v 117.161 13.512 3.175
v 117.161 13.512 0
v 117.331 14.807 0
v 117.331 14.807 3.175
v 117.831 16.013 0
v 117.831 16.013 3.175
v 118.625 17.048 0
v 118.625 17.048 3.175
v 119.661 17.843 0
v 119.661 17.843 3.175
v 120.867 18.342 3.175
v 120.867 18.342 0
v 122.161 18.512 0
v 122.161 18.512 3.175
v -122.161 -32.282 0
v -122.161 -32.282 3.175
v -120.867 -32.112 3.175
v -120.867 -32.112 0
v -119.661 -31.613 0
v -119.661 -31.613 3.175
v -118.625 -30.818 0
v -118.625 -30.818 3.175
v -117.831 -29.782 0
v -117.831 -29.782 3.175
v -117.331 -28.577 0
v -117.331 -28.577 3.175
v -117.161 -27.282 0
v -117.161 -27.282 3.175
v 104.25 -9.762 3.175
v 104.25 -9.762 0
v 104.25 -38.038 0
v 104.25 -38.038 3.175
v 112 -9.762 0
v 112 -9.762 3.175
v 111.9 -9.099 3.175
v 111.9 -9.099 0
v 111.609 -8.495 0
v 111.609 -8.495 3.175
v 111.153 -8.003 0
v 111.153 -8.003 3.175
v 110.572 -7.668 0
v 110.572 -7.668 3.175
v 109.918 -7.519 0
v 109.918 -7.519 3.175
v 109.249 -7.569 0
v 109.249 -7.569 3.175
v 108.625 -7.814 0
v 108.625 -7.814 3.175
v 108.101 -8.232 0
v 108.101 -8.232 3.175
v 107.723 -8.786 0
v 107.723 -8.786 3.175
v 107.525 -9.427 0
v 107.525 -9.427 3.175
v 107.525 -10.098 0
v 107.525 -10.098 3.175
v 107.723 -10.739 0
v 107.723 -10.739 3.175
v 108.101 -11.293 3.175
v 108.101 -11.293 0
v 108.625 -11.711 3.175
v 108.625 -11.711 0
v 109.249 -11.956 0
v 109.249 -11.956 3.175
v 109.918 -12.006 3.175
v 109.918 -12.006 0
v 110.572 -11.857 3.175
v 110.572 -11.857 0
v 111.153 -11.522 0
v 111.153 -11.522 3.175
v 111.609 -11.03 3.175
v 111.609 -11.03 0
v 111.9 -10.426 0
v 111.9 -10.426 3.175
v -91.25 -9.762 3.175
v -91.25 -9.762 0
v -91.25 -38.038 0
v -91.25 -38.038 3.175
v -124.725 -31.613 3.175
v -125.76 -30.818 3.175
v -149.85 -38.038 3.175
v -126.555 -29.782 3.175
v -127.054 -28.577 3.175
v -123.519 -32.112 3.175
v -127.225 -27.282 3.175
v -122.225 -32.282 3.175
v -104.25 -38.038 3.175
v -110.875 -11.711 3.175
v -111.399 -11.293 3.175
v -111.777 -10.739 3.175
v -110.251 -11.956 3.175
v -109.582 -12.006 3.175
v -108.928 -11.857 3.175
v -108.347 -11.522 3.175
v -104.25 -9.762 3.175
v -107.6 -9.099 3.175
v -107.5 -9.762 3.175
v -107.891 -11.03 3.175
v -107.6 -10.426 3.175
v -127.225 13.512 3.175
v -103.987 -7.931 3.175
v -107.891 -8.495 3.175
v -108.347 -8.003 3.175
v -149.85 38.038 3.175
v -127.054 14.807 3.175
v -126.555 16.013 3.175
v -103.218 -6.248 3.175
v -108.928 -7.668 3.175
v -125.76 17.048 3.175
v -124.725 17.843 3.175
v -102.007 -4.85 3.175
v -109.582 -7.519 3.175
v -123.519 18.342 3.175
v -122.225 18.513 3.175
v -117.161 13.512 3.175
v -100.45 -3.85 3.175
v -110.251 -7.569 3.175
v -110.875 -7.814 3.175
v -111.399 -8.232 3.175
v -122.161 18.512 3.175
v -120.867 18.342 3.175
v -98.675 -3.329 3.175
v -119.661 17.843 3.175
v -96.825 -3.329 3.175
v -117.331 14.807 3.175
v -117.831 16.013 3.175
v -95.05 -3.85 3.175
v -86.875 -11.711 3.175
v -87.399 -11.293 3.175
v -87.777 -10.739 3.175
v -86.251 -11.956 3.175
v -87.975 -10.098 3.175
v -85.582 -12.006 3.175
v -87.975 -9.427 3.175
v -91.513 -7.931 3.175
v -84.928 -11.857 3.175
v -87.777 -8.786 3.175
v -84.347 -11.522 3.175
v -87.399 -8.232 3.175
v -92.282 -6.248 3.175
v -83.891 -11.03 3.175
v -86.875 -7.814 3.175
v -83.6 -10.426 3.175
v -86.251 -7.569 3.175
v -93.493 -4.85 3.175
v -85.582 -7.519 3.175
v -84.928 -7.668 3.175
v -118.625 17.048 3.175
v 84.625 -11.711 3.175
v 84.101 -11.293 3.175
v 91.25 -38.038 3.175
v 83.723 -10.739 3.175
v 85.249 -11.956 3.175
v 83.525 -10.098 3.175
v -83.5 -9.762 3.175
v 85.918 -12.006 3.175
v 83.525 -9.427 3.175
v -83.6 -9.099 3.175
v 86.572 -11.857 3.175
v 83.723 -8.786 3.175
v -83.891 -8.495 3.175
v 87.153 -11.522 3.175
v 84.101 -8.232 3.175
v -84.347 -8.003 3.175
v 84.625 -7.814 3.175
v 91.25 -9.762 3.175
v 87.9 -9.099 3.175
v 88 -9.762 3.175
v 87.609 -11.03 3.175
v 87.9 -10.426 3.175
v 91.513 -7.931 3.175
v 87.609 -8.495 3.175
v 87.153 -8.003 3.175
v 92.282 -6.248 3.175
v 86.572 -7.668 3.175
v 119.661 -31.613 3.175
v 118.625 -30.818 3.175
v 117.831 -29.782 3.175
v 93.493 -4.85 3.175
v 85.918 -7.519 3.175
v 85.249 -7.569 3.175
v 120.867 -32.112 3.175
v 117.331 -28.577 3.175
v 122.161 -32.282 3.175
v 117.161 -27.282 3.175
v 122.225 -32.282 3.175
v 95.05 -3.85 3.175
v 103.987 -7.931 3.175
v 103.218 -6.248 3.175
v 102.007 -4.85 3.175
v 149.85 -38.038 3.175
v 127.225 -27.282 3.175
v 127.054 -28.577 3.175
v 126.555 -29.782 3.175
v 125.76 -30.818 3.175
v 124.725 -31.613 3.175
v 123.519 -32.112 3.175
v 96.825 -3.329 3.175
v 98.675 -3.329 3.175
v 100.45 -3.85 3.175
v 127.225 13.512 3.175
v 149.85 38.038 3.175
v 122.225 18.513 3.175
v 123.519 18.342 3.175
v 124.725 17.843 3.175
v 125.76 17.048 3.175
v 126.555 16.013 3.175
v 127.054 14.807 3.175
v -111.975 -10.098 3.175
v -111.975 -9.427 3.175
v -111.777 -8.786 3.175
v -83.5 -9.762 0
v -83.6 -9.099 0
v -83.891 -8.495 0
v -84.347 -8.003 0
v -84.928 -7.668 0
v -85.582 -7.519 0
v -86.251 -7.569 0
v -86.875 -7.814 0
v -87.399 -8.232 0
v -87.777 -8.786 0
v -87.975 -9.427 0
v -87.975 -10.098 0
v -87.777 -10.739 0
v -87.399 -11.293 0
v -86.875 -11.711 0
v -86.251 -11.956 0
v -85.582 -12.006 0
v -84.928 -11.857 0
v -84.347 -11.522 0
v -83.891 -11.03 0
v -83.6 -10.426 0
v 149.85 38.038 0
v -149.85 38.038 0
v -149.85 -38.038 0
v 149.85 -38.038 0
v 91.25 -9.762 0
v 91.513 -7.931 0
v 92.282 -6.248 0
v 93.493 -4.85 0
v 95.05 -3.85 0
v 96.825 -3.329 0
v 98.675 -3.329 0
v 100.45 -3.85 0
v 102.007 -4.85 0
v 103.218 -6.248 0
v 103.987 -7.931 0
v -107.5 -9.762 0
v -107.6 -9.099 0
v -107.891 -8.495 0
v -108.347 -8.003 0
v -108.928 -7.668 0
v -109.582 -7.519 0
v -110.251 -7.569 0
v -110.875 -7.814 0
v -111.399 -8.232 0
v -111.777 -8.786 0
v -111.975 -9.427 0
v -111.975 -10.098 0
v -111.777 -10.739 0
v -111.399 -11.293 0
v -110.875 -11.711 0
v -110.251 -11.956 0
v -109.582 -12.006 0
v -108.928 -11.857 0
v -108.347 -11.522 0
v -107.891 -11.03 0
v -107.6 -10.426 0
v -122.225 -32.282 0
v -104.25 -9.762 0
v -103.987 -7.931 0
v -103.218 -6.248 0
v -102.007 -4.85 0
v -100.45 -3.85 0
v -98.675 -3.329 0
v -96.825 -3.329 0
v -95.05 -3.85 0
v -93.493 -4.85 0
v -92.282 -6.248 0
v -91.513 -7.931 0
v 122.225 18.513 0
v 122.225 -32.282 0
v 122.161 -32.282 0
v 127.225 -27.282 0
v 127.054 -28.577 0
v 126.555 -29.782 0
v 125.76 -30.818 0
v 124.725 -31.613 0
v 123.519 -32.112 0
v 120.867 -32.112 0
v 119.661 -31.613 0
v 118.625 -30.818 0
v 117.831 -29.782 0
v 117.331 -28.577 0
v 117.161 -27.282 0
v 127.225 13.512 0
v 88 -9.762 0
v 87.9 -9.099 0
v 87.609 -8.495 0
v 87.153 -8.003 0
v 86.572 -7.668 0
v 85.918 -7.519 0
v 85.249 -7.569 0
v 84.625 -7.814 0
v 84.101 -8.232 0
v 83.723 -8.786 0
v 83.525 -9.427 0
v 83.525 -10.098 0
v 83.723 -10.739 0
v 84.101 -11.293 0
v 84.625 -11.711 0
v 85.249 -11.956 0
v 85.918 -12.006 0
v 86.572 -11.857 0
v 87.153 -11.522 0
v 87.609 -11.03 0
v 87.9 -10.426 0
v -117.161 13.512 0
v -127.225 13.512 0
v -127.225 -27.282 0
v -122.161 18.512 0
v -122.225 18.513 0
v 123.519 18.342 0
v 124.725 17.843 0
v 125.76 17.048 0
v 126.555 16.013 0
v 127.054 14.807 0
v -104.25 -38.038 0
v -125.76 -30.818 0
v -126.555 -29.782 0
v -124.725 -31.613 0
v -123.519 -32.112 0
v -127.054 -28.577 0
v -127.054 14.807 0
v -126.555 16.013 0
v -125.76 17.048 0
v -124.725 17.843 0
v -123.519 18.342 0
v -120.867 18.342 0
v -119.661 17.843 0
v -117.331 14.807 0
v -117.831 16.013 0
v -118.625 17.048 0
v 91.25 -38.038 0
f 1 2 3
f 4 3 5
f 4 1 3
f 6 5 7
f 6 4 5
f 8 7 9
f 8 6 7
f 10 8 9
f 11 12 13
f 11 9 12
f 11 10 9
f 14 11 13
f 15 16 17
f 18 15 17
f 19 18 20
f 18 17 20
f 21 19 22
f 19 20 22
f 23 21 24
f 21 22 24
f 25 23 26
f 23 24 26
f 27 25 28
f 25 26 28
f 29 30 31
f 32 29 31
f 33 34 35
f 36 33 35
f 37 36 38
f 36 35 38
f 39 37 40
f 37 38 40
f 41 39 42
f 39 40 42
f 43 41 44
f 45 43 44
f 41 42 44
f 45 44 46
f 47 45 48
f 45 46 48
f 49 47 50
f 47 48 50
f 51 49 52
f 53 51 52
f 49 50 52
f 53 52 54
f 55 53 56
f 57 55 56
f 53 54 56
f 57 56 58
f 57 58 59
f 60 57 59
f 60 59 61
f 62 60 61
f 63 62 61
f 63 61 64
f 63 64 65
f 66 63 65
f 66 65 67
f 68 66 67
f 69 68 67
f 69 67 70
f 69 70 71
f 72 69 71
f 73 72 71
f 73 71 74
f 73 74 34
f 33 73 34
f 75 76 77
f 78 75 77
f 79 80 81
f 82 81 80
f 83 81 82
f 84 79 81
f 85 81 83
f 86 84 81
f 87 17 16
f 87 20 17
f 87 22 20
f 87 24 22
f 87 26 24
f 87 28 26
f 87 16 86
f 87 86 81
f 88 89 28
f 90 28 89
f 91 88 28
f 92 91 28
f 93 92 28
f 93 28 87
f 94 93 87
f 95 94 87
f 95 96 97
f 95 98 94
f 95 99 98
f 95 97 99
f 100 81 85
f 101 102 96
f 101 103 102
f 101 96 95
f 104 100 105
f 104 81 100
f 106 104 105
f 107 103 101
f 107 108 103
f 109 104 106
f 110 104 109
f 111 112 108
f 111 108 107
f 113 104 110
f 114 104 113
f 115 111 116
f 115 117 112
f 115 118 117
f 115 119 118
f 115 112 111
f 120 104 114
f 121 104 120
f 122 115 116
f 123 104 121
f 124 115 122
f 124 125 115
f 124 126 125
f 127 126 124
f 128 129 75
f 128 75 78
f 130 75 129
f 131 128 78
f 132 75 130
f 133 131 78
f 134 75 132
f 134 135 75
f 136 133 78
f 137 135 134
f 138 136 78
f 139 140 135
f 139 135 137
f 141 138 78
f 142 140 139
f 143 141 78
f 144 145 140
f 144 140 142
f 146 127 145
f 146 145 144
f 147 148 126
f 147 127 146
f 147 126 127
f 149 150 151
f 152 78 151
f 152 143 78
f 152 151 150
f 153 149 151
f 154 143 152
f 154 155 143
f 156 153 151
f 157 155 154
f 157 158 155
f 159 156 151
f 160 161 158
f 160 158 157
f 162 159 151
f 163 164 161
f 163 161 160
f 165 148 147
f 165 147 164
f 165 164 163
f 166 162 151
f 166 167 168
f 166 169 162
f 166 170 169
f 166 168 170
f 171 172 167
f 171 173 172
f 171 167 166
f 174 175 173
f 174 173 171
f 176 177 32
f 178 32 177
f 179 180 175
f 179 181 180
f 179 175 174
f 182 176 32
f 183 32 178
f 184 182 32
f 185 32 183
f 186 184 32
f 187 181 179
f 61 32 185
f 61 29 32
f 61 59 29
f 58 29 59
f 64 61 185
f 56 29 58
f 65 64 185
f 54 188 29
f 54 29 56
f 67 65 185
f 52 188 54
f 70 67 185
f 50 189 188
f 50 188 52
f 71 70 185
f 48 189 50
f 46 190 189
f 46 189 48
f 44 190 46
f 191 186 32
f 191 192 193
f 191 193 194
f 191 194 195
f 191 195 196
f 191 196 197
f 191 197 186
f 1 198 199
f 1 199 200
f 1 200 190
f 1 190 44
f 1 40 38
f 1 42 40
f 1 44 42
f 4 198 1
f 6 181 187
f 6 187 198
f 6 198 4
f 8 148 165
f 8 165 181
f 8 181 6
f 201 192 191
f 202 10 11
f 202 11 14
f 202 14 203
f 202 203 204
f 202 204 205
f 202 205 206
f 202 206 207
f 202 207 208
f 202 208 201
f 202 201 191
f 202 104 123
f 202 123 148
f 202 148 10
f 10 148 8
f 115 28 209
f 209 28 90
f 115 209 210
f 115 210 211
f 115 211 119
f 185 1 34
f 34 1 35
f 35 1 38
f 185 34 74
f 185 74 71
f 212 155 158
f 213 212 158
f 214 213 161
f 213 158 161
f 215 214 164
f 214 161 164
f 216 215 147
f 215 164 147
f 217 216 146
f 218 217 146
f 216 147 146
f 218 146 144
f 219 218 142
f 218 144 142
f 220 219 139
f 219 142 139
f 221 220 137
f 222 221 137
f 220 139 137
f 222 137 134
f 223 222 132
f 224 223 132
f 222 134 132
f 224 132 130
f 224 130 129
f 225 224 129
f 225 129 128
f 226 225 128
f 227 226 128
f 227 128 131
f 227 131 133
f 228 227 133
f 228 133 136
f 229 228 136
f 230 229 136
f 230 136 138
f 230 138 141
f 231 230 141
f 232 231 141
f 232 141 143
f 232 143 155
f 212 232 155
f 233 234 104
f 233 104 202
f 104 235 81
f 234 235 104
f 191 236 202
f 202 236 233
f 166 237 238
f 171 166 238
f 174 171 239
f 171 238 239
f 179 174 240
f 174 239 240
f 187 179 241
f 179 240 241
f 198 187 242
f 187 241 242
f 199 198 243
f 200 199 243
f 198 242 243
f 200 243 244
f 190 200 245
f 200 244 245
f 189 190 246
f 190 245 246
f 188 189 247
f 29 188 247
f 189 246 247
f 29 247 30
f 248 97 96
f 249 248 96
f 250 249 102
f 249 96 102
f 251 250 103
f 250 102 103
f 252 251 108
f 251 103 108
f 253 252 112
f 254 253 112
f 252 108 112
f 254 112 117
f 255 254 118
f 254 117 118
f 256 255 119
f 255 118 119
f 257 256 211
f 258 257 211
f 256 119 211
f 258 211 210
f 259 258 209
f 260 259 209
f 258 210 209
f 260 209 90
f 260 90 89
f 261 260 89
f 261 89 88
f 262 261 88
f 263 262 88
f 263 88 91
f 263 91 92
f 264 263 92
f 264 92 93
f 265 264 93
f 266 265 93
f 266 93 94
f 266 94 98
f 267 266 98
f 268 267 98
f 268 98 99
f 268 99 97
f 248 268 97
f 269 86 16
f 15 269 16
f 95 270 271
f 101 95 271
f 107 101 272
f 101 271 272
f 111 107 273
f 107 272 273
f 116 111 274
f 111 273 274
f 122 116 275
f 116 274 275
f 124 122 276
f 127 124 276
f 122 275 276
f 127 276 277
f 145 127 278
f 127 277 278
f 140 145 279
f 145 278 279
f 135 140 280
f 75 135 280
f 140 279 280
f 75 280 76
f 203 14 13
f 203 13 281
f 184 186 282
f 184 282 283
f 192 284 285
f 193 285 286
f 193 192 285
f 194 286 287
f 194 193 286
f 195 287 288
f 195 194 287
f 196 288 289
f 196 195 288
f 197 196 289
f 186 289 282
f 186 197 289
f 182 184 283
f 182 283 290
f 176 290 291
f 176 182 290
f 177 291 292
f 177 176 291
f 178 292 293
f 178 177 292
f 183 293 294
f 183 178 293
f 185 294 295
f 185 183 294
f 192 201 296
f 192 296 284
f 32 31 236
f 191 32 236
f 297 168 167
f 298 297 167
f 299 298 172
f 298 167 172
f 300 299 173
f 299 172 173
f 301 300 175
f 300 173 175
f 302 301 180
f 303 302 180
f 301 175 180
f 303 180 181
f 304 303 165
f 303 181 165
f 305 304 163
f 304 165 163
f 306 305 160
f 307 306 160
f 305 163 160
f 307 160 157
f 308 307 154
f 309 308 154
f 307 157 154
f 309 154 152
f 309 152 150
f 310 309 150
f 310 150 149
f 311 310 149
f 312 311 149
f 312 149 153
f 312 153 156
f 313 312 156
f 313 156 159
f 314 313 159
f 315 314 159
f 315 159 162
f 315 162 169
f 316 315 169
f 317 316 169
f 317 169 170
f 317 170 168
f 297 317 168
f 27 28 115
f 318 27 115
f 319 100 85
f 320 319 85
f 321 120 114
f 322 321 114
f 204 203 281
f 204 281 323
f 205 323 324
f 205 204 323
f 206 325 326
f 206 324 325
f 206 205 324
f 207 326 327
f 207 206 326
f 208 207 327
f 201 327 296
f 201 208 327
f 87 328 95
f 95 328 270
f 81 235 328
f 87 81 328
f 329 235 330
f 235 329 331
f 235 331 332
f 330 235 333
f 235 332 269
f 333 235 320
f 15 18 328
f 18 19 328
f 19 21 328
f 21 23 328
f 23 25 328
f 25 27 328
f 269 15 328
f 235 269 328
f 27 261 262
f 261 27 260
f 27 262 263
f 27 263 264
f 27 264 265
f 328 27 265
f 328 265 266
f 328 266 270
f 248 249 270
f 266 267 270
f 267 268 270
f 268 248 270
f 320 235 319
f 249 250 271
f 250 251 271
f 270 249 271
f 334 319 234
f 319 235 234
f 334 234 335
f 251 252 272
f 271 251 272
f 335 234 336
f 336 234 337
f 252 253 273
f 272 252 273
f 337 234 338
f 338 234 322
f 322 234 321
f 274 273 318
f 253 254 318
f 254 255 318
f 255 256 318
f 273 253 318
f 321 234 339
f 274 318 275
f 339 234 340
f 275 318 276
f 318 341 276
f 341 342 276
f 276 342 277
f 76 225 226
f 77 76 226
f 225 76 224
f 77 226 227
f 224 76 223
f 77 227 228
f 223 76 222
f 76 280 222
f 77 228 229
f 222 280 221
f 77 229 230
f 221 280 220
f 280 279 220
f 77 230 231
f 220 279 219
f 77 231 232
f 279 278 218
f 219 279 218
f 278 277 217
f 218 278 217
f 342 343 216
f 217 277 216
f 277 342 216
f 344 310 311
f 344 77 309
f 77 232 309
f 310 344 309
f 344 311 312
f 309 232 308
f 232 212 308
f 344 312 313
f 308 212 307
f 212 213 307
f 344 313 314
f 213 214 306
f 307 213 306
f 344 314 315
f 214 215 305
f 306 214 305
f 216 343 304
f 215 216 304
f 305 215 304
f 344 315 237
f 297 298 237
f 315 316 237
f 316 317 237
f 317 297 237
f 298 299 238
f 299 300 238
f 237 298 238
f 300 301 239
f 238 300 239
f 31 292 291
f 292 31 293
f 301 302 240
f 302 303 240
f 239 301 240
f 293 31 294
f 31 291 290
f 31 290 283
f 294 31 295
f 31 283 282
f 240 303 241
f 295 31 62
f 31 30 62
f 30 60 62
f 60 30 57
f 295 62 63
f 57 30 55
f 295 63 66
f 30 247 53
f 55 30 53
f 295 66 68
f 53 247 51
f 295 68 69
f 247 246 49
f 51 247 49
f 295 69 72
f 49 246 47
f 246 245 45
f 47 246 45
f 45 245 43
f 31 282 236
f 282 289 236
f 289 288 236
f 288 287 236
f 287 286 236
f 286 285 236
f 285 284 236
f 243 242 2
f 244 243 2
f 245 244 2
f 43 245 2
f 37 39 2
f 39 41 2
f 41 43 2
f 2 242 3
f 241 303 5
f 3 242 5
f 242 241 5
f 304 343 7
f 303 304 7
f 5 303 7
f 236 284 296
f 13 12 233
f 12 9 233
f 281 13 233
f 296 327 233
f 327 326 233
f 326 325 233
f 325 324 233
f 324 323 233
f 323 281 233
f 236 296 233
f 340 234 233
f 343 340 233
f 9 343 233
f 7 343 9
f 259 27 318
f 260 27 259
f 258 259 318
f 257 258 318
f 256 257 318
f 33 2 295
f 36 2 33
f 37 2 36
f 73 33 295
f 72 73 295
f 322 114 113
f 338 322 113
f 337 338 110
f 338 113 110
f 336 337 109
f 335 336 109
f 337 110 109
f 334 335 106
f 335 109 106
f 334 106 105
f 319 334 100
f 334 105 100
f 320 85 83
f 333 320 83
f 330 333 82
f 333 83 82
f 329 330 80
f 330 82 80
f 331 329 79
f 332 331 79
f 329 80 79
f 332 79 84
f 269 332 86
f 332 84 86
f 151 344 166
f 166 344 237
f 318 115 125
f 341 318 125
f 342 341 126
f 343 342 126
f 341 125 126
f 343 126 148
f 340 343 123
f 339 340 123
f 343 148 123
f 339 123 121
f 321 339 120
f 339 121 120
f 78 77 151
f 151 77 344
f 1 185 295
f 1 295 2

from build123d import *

# Parameters (mm, degrees)
SKETCH1_W            = 299.7
SKETCH1_H            = 76.075
BOSS_EXTRUDE1_DEPTH  = 3.175
CUT_EXTRUDE4_DEPTH   = 155.634907221
SKETCH3_R            = 6.5
CUT_EXTRUDE5_DEPTH   = 155.634907221
M4_CLEARANCE_HOLE1_D = 4.5


with BuildPart() as part:
    # Sketch1 → Boss-Extrude1 (new body)
    with BuildSketch(Plane.XY):
        Rectangle(SKETCH1_W, SKETCH1_H)
    extrude(amount=BOSS_EXTRUDE1_DEPTH)

    # Sketch8 → Cut-Extrude4 (cut, through all)
    with BuildSketch(Plane.XY.offset(3.175)):
        with BuildLine():
            Line((122.1609, 18.5125), (122.2247, 18.5125))
            ThreePointArc((122.2247, 18.5125), (125.760233906, 17.048033906), (127.2247, 13.5125))
            Line((127.2247, 13.5125), (127.2247, -27.282435401))
            ThreePointArc((127.2247, -27.282435401), (125.760233906, -30.817969307), (122.2247, -32.282435401))
            Line((122.2247, -32.282435401), (122.1609, -32.282435401))
            ThreePointArc((122.1609, -32.282435401), (118.625366094, -30.817969307), (117.1609, -27.282435401))
            Line((117.1609, -27.282435401), (117.1609, 13.5125))
            ThreePointArc((117.1609, 13.5125), (118.625366094, 17.048033906), (122.1609, 18.5125))
        make_face()
    cut_extrude4 = extrude(amount=-CUT_EXTRUDE4_DEPTH, mode=Mode.SUBTRACT)

    # Mirror3: Cut-Extrude4 across plane
    add(cut_extrude4.mirror(Plane(origin=(0, 0, 0), x_dir=(0, 0, 1), z_dir=(1, 0, 0))), mode=Mode.SUBTRACT)

    # Sketch3 → Cut-Extrude5 (cut, through all)
    with BuildSketch(Plane(origin=(0, 0, 0), x_dir=(-1, 0, 0), z_dir=(0, 0, -1))):
        with Locations((-97.75, -9.7625)):
            Circle(SKETCH3_R)
        with BuildLine():
            Line((-104.25, -38.0375), (-91.25, -38.0375))
            Line((-91.25, -38.0375), (-91.25, -9.7625))
            ThreePointArc((-91.25, -9.7625), (-97.75, -16.2625), (-104.25, -9.7625))
            Line((-104.25, -9.7625), (-104.25, -38.0375))
        make_face()
        with Locations((97.75, -9.7625)):
            Circle(SKETCH3_R)
        with BuildLine():
            Line((91.25, -38.0375), (104.25, -38.0375))
            Line((104.25, -38.0375), (104.25, -9.7625))
            ThreePointArc((104.25, -9.7625), (97.75, -16.2625), (91.25, -9.7625))
            Line((91.25, -9.7625), (91.25, -38.0375))
        make_face()
    extrude(amount=-CUT_EXTRUDE5_DEPTH, mode=Mode.SUBTRACT)

    # M4 Clearance Hole1 (through all)
    with Locations(Plane(origin=(0, 0, 0), x_dir=(-1, 0, 0), z_dir=(0, 0, -1))):
        with Locations((-85.75, -9.7625), (-109.75, -9.7625), (109.75, -9.7625), (85.75, -9.7625)):
            Hole(M4_CLEARANCE_HOLE1_D / 2)


solid = part.part
